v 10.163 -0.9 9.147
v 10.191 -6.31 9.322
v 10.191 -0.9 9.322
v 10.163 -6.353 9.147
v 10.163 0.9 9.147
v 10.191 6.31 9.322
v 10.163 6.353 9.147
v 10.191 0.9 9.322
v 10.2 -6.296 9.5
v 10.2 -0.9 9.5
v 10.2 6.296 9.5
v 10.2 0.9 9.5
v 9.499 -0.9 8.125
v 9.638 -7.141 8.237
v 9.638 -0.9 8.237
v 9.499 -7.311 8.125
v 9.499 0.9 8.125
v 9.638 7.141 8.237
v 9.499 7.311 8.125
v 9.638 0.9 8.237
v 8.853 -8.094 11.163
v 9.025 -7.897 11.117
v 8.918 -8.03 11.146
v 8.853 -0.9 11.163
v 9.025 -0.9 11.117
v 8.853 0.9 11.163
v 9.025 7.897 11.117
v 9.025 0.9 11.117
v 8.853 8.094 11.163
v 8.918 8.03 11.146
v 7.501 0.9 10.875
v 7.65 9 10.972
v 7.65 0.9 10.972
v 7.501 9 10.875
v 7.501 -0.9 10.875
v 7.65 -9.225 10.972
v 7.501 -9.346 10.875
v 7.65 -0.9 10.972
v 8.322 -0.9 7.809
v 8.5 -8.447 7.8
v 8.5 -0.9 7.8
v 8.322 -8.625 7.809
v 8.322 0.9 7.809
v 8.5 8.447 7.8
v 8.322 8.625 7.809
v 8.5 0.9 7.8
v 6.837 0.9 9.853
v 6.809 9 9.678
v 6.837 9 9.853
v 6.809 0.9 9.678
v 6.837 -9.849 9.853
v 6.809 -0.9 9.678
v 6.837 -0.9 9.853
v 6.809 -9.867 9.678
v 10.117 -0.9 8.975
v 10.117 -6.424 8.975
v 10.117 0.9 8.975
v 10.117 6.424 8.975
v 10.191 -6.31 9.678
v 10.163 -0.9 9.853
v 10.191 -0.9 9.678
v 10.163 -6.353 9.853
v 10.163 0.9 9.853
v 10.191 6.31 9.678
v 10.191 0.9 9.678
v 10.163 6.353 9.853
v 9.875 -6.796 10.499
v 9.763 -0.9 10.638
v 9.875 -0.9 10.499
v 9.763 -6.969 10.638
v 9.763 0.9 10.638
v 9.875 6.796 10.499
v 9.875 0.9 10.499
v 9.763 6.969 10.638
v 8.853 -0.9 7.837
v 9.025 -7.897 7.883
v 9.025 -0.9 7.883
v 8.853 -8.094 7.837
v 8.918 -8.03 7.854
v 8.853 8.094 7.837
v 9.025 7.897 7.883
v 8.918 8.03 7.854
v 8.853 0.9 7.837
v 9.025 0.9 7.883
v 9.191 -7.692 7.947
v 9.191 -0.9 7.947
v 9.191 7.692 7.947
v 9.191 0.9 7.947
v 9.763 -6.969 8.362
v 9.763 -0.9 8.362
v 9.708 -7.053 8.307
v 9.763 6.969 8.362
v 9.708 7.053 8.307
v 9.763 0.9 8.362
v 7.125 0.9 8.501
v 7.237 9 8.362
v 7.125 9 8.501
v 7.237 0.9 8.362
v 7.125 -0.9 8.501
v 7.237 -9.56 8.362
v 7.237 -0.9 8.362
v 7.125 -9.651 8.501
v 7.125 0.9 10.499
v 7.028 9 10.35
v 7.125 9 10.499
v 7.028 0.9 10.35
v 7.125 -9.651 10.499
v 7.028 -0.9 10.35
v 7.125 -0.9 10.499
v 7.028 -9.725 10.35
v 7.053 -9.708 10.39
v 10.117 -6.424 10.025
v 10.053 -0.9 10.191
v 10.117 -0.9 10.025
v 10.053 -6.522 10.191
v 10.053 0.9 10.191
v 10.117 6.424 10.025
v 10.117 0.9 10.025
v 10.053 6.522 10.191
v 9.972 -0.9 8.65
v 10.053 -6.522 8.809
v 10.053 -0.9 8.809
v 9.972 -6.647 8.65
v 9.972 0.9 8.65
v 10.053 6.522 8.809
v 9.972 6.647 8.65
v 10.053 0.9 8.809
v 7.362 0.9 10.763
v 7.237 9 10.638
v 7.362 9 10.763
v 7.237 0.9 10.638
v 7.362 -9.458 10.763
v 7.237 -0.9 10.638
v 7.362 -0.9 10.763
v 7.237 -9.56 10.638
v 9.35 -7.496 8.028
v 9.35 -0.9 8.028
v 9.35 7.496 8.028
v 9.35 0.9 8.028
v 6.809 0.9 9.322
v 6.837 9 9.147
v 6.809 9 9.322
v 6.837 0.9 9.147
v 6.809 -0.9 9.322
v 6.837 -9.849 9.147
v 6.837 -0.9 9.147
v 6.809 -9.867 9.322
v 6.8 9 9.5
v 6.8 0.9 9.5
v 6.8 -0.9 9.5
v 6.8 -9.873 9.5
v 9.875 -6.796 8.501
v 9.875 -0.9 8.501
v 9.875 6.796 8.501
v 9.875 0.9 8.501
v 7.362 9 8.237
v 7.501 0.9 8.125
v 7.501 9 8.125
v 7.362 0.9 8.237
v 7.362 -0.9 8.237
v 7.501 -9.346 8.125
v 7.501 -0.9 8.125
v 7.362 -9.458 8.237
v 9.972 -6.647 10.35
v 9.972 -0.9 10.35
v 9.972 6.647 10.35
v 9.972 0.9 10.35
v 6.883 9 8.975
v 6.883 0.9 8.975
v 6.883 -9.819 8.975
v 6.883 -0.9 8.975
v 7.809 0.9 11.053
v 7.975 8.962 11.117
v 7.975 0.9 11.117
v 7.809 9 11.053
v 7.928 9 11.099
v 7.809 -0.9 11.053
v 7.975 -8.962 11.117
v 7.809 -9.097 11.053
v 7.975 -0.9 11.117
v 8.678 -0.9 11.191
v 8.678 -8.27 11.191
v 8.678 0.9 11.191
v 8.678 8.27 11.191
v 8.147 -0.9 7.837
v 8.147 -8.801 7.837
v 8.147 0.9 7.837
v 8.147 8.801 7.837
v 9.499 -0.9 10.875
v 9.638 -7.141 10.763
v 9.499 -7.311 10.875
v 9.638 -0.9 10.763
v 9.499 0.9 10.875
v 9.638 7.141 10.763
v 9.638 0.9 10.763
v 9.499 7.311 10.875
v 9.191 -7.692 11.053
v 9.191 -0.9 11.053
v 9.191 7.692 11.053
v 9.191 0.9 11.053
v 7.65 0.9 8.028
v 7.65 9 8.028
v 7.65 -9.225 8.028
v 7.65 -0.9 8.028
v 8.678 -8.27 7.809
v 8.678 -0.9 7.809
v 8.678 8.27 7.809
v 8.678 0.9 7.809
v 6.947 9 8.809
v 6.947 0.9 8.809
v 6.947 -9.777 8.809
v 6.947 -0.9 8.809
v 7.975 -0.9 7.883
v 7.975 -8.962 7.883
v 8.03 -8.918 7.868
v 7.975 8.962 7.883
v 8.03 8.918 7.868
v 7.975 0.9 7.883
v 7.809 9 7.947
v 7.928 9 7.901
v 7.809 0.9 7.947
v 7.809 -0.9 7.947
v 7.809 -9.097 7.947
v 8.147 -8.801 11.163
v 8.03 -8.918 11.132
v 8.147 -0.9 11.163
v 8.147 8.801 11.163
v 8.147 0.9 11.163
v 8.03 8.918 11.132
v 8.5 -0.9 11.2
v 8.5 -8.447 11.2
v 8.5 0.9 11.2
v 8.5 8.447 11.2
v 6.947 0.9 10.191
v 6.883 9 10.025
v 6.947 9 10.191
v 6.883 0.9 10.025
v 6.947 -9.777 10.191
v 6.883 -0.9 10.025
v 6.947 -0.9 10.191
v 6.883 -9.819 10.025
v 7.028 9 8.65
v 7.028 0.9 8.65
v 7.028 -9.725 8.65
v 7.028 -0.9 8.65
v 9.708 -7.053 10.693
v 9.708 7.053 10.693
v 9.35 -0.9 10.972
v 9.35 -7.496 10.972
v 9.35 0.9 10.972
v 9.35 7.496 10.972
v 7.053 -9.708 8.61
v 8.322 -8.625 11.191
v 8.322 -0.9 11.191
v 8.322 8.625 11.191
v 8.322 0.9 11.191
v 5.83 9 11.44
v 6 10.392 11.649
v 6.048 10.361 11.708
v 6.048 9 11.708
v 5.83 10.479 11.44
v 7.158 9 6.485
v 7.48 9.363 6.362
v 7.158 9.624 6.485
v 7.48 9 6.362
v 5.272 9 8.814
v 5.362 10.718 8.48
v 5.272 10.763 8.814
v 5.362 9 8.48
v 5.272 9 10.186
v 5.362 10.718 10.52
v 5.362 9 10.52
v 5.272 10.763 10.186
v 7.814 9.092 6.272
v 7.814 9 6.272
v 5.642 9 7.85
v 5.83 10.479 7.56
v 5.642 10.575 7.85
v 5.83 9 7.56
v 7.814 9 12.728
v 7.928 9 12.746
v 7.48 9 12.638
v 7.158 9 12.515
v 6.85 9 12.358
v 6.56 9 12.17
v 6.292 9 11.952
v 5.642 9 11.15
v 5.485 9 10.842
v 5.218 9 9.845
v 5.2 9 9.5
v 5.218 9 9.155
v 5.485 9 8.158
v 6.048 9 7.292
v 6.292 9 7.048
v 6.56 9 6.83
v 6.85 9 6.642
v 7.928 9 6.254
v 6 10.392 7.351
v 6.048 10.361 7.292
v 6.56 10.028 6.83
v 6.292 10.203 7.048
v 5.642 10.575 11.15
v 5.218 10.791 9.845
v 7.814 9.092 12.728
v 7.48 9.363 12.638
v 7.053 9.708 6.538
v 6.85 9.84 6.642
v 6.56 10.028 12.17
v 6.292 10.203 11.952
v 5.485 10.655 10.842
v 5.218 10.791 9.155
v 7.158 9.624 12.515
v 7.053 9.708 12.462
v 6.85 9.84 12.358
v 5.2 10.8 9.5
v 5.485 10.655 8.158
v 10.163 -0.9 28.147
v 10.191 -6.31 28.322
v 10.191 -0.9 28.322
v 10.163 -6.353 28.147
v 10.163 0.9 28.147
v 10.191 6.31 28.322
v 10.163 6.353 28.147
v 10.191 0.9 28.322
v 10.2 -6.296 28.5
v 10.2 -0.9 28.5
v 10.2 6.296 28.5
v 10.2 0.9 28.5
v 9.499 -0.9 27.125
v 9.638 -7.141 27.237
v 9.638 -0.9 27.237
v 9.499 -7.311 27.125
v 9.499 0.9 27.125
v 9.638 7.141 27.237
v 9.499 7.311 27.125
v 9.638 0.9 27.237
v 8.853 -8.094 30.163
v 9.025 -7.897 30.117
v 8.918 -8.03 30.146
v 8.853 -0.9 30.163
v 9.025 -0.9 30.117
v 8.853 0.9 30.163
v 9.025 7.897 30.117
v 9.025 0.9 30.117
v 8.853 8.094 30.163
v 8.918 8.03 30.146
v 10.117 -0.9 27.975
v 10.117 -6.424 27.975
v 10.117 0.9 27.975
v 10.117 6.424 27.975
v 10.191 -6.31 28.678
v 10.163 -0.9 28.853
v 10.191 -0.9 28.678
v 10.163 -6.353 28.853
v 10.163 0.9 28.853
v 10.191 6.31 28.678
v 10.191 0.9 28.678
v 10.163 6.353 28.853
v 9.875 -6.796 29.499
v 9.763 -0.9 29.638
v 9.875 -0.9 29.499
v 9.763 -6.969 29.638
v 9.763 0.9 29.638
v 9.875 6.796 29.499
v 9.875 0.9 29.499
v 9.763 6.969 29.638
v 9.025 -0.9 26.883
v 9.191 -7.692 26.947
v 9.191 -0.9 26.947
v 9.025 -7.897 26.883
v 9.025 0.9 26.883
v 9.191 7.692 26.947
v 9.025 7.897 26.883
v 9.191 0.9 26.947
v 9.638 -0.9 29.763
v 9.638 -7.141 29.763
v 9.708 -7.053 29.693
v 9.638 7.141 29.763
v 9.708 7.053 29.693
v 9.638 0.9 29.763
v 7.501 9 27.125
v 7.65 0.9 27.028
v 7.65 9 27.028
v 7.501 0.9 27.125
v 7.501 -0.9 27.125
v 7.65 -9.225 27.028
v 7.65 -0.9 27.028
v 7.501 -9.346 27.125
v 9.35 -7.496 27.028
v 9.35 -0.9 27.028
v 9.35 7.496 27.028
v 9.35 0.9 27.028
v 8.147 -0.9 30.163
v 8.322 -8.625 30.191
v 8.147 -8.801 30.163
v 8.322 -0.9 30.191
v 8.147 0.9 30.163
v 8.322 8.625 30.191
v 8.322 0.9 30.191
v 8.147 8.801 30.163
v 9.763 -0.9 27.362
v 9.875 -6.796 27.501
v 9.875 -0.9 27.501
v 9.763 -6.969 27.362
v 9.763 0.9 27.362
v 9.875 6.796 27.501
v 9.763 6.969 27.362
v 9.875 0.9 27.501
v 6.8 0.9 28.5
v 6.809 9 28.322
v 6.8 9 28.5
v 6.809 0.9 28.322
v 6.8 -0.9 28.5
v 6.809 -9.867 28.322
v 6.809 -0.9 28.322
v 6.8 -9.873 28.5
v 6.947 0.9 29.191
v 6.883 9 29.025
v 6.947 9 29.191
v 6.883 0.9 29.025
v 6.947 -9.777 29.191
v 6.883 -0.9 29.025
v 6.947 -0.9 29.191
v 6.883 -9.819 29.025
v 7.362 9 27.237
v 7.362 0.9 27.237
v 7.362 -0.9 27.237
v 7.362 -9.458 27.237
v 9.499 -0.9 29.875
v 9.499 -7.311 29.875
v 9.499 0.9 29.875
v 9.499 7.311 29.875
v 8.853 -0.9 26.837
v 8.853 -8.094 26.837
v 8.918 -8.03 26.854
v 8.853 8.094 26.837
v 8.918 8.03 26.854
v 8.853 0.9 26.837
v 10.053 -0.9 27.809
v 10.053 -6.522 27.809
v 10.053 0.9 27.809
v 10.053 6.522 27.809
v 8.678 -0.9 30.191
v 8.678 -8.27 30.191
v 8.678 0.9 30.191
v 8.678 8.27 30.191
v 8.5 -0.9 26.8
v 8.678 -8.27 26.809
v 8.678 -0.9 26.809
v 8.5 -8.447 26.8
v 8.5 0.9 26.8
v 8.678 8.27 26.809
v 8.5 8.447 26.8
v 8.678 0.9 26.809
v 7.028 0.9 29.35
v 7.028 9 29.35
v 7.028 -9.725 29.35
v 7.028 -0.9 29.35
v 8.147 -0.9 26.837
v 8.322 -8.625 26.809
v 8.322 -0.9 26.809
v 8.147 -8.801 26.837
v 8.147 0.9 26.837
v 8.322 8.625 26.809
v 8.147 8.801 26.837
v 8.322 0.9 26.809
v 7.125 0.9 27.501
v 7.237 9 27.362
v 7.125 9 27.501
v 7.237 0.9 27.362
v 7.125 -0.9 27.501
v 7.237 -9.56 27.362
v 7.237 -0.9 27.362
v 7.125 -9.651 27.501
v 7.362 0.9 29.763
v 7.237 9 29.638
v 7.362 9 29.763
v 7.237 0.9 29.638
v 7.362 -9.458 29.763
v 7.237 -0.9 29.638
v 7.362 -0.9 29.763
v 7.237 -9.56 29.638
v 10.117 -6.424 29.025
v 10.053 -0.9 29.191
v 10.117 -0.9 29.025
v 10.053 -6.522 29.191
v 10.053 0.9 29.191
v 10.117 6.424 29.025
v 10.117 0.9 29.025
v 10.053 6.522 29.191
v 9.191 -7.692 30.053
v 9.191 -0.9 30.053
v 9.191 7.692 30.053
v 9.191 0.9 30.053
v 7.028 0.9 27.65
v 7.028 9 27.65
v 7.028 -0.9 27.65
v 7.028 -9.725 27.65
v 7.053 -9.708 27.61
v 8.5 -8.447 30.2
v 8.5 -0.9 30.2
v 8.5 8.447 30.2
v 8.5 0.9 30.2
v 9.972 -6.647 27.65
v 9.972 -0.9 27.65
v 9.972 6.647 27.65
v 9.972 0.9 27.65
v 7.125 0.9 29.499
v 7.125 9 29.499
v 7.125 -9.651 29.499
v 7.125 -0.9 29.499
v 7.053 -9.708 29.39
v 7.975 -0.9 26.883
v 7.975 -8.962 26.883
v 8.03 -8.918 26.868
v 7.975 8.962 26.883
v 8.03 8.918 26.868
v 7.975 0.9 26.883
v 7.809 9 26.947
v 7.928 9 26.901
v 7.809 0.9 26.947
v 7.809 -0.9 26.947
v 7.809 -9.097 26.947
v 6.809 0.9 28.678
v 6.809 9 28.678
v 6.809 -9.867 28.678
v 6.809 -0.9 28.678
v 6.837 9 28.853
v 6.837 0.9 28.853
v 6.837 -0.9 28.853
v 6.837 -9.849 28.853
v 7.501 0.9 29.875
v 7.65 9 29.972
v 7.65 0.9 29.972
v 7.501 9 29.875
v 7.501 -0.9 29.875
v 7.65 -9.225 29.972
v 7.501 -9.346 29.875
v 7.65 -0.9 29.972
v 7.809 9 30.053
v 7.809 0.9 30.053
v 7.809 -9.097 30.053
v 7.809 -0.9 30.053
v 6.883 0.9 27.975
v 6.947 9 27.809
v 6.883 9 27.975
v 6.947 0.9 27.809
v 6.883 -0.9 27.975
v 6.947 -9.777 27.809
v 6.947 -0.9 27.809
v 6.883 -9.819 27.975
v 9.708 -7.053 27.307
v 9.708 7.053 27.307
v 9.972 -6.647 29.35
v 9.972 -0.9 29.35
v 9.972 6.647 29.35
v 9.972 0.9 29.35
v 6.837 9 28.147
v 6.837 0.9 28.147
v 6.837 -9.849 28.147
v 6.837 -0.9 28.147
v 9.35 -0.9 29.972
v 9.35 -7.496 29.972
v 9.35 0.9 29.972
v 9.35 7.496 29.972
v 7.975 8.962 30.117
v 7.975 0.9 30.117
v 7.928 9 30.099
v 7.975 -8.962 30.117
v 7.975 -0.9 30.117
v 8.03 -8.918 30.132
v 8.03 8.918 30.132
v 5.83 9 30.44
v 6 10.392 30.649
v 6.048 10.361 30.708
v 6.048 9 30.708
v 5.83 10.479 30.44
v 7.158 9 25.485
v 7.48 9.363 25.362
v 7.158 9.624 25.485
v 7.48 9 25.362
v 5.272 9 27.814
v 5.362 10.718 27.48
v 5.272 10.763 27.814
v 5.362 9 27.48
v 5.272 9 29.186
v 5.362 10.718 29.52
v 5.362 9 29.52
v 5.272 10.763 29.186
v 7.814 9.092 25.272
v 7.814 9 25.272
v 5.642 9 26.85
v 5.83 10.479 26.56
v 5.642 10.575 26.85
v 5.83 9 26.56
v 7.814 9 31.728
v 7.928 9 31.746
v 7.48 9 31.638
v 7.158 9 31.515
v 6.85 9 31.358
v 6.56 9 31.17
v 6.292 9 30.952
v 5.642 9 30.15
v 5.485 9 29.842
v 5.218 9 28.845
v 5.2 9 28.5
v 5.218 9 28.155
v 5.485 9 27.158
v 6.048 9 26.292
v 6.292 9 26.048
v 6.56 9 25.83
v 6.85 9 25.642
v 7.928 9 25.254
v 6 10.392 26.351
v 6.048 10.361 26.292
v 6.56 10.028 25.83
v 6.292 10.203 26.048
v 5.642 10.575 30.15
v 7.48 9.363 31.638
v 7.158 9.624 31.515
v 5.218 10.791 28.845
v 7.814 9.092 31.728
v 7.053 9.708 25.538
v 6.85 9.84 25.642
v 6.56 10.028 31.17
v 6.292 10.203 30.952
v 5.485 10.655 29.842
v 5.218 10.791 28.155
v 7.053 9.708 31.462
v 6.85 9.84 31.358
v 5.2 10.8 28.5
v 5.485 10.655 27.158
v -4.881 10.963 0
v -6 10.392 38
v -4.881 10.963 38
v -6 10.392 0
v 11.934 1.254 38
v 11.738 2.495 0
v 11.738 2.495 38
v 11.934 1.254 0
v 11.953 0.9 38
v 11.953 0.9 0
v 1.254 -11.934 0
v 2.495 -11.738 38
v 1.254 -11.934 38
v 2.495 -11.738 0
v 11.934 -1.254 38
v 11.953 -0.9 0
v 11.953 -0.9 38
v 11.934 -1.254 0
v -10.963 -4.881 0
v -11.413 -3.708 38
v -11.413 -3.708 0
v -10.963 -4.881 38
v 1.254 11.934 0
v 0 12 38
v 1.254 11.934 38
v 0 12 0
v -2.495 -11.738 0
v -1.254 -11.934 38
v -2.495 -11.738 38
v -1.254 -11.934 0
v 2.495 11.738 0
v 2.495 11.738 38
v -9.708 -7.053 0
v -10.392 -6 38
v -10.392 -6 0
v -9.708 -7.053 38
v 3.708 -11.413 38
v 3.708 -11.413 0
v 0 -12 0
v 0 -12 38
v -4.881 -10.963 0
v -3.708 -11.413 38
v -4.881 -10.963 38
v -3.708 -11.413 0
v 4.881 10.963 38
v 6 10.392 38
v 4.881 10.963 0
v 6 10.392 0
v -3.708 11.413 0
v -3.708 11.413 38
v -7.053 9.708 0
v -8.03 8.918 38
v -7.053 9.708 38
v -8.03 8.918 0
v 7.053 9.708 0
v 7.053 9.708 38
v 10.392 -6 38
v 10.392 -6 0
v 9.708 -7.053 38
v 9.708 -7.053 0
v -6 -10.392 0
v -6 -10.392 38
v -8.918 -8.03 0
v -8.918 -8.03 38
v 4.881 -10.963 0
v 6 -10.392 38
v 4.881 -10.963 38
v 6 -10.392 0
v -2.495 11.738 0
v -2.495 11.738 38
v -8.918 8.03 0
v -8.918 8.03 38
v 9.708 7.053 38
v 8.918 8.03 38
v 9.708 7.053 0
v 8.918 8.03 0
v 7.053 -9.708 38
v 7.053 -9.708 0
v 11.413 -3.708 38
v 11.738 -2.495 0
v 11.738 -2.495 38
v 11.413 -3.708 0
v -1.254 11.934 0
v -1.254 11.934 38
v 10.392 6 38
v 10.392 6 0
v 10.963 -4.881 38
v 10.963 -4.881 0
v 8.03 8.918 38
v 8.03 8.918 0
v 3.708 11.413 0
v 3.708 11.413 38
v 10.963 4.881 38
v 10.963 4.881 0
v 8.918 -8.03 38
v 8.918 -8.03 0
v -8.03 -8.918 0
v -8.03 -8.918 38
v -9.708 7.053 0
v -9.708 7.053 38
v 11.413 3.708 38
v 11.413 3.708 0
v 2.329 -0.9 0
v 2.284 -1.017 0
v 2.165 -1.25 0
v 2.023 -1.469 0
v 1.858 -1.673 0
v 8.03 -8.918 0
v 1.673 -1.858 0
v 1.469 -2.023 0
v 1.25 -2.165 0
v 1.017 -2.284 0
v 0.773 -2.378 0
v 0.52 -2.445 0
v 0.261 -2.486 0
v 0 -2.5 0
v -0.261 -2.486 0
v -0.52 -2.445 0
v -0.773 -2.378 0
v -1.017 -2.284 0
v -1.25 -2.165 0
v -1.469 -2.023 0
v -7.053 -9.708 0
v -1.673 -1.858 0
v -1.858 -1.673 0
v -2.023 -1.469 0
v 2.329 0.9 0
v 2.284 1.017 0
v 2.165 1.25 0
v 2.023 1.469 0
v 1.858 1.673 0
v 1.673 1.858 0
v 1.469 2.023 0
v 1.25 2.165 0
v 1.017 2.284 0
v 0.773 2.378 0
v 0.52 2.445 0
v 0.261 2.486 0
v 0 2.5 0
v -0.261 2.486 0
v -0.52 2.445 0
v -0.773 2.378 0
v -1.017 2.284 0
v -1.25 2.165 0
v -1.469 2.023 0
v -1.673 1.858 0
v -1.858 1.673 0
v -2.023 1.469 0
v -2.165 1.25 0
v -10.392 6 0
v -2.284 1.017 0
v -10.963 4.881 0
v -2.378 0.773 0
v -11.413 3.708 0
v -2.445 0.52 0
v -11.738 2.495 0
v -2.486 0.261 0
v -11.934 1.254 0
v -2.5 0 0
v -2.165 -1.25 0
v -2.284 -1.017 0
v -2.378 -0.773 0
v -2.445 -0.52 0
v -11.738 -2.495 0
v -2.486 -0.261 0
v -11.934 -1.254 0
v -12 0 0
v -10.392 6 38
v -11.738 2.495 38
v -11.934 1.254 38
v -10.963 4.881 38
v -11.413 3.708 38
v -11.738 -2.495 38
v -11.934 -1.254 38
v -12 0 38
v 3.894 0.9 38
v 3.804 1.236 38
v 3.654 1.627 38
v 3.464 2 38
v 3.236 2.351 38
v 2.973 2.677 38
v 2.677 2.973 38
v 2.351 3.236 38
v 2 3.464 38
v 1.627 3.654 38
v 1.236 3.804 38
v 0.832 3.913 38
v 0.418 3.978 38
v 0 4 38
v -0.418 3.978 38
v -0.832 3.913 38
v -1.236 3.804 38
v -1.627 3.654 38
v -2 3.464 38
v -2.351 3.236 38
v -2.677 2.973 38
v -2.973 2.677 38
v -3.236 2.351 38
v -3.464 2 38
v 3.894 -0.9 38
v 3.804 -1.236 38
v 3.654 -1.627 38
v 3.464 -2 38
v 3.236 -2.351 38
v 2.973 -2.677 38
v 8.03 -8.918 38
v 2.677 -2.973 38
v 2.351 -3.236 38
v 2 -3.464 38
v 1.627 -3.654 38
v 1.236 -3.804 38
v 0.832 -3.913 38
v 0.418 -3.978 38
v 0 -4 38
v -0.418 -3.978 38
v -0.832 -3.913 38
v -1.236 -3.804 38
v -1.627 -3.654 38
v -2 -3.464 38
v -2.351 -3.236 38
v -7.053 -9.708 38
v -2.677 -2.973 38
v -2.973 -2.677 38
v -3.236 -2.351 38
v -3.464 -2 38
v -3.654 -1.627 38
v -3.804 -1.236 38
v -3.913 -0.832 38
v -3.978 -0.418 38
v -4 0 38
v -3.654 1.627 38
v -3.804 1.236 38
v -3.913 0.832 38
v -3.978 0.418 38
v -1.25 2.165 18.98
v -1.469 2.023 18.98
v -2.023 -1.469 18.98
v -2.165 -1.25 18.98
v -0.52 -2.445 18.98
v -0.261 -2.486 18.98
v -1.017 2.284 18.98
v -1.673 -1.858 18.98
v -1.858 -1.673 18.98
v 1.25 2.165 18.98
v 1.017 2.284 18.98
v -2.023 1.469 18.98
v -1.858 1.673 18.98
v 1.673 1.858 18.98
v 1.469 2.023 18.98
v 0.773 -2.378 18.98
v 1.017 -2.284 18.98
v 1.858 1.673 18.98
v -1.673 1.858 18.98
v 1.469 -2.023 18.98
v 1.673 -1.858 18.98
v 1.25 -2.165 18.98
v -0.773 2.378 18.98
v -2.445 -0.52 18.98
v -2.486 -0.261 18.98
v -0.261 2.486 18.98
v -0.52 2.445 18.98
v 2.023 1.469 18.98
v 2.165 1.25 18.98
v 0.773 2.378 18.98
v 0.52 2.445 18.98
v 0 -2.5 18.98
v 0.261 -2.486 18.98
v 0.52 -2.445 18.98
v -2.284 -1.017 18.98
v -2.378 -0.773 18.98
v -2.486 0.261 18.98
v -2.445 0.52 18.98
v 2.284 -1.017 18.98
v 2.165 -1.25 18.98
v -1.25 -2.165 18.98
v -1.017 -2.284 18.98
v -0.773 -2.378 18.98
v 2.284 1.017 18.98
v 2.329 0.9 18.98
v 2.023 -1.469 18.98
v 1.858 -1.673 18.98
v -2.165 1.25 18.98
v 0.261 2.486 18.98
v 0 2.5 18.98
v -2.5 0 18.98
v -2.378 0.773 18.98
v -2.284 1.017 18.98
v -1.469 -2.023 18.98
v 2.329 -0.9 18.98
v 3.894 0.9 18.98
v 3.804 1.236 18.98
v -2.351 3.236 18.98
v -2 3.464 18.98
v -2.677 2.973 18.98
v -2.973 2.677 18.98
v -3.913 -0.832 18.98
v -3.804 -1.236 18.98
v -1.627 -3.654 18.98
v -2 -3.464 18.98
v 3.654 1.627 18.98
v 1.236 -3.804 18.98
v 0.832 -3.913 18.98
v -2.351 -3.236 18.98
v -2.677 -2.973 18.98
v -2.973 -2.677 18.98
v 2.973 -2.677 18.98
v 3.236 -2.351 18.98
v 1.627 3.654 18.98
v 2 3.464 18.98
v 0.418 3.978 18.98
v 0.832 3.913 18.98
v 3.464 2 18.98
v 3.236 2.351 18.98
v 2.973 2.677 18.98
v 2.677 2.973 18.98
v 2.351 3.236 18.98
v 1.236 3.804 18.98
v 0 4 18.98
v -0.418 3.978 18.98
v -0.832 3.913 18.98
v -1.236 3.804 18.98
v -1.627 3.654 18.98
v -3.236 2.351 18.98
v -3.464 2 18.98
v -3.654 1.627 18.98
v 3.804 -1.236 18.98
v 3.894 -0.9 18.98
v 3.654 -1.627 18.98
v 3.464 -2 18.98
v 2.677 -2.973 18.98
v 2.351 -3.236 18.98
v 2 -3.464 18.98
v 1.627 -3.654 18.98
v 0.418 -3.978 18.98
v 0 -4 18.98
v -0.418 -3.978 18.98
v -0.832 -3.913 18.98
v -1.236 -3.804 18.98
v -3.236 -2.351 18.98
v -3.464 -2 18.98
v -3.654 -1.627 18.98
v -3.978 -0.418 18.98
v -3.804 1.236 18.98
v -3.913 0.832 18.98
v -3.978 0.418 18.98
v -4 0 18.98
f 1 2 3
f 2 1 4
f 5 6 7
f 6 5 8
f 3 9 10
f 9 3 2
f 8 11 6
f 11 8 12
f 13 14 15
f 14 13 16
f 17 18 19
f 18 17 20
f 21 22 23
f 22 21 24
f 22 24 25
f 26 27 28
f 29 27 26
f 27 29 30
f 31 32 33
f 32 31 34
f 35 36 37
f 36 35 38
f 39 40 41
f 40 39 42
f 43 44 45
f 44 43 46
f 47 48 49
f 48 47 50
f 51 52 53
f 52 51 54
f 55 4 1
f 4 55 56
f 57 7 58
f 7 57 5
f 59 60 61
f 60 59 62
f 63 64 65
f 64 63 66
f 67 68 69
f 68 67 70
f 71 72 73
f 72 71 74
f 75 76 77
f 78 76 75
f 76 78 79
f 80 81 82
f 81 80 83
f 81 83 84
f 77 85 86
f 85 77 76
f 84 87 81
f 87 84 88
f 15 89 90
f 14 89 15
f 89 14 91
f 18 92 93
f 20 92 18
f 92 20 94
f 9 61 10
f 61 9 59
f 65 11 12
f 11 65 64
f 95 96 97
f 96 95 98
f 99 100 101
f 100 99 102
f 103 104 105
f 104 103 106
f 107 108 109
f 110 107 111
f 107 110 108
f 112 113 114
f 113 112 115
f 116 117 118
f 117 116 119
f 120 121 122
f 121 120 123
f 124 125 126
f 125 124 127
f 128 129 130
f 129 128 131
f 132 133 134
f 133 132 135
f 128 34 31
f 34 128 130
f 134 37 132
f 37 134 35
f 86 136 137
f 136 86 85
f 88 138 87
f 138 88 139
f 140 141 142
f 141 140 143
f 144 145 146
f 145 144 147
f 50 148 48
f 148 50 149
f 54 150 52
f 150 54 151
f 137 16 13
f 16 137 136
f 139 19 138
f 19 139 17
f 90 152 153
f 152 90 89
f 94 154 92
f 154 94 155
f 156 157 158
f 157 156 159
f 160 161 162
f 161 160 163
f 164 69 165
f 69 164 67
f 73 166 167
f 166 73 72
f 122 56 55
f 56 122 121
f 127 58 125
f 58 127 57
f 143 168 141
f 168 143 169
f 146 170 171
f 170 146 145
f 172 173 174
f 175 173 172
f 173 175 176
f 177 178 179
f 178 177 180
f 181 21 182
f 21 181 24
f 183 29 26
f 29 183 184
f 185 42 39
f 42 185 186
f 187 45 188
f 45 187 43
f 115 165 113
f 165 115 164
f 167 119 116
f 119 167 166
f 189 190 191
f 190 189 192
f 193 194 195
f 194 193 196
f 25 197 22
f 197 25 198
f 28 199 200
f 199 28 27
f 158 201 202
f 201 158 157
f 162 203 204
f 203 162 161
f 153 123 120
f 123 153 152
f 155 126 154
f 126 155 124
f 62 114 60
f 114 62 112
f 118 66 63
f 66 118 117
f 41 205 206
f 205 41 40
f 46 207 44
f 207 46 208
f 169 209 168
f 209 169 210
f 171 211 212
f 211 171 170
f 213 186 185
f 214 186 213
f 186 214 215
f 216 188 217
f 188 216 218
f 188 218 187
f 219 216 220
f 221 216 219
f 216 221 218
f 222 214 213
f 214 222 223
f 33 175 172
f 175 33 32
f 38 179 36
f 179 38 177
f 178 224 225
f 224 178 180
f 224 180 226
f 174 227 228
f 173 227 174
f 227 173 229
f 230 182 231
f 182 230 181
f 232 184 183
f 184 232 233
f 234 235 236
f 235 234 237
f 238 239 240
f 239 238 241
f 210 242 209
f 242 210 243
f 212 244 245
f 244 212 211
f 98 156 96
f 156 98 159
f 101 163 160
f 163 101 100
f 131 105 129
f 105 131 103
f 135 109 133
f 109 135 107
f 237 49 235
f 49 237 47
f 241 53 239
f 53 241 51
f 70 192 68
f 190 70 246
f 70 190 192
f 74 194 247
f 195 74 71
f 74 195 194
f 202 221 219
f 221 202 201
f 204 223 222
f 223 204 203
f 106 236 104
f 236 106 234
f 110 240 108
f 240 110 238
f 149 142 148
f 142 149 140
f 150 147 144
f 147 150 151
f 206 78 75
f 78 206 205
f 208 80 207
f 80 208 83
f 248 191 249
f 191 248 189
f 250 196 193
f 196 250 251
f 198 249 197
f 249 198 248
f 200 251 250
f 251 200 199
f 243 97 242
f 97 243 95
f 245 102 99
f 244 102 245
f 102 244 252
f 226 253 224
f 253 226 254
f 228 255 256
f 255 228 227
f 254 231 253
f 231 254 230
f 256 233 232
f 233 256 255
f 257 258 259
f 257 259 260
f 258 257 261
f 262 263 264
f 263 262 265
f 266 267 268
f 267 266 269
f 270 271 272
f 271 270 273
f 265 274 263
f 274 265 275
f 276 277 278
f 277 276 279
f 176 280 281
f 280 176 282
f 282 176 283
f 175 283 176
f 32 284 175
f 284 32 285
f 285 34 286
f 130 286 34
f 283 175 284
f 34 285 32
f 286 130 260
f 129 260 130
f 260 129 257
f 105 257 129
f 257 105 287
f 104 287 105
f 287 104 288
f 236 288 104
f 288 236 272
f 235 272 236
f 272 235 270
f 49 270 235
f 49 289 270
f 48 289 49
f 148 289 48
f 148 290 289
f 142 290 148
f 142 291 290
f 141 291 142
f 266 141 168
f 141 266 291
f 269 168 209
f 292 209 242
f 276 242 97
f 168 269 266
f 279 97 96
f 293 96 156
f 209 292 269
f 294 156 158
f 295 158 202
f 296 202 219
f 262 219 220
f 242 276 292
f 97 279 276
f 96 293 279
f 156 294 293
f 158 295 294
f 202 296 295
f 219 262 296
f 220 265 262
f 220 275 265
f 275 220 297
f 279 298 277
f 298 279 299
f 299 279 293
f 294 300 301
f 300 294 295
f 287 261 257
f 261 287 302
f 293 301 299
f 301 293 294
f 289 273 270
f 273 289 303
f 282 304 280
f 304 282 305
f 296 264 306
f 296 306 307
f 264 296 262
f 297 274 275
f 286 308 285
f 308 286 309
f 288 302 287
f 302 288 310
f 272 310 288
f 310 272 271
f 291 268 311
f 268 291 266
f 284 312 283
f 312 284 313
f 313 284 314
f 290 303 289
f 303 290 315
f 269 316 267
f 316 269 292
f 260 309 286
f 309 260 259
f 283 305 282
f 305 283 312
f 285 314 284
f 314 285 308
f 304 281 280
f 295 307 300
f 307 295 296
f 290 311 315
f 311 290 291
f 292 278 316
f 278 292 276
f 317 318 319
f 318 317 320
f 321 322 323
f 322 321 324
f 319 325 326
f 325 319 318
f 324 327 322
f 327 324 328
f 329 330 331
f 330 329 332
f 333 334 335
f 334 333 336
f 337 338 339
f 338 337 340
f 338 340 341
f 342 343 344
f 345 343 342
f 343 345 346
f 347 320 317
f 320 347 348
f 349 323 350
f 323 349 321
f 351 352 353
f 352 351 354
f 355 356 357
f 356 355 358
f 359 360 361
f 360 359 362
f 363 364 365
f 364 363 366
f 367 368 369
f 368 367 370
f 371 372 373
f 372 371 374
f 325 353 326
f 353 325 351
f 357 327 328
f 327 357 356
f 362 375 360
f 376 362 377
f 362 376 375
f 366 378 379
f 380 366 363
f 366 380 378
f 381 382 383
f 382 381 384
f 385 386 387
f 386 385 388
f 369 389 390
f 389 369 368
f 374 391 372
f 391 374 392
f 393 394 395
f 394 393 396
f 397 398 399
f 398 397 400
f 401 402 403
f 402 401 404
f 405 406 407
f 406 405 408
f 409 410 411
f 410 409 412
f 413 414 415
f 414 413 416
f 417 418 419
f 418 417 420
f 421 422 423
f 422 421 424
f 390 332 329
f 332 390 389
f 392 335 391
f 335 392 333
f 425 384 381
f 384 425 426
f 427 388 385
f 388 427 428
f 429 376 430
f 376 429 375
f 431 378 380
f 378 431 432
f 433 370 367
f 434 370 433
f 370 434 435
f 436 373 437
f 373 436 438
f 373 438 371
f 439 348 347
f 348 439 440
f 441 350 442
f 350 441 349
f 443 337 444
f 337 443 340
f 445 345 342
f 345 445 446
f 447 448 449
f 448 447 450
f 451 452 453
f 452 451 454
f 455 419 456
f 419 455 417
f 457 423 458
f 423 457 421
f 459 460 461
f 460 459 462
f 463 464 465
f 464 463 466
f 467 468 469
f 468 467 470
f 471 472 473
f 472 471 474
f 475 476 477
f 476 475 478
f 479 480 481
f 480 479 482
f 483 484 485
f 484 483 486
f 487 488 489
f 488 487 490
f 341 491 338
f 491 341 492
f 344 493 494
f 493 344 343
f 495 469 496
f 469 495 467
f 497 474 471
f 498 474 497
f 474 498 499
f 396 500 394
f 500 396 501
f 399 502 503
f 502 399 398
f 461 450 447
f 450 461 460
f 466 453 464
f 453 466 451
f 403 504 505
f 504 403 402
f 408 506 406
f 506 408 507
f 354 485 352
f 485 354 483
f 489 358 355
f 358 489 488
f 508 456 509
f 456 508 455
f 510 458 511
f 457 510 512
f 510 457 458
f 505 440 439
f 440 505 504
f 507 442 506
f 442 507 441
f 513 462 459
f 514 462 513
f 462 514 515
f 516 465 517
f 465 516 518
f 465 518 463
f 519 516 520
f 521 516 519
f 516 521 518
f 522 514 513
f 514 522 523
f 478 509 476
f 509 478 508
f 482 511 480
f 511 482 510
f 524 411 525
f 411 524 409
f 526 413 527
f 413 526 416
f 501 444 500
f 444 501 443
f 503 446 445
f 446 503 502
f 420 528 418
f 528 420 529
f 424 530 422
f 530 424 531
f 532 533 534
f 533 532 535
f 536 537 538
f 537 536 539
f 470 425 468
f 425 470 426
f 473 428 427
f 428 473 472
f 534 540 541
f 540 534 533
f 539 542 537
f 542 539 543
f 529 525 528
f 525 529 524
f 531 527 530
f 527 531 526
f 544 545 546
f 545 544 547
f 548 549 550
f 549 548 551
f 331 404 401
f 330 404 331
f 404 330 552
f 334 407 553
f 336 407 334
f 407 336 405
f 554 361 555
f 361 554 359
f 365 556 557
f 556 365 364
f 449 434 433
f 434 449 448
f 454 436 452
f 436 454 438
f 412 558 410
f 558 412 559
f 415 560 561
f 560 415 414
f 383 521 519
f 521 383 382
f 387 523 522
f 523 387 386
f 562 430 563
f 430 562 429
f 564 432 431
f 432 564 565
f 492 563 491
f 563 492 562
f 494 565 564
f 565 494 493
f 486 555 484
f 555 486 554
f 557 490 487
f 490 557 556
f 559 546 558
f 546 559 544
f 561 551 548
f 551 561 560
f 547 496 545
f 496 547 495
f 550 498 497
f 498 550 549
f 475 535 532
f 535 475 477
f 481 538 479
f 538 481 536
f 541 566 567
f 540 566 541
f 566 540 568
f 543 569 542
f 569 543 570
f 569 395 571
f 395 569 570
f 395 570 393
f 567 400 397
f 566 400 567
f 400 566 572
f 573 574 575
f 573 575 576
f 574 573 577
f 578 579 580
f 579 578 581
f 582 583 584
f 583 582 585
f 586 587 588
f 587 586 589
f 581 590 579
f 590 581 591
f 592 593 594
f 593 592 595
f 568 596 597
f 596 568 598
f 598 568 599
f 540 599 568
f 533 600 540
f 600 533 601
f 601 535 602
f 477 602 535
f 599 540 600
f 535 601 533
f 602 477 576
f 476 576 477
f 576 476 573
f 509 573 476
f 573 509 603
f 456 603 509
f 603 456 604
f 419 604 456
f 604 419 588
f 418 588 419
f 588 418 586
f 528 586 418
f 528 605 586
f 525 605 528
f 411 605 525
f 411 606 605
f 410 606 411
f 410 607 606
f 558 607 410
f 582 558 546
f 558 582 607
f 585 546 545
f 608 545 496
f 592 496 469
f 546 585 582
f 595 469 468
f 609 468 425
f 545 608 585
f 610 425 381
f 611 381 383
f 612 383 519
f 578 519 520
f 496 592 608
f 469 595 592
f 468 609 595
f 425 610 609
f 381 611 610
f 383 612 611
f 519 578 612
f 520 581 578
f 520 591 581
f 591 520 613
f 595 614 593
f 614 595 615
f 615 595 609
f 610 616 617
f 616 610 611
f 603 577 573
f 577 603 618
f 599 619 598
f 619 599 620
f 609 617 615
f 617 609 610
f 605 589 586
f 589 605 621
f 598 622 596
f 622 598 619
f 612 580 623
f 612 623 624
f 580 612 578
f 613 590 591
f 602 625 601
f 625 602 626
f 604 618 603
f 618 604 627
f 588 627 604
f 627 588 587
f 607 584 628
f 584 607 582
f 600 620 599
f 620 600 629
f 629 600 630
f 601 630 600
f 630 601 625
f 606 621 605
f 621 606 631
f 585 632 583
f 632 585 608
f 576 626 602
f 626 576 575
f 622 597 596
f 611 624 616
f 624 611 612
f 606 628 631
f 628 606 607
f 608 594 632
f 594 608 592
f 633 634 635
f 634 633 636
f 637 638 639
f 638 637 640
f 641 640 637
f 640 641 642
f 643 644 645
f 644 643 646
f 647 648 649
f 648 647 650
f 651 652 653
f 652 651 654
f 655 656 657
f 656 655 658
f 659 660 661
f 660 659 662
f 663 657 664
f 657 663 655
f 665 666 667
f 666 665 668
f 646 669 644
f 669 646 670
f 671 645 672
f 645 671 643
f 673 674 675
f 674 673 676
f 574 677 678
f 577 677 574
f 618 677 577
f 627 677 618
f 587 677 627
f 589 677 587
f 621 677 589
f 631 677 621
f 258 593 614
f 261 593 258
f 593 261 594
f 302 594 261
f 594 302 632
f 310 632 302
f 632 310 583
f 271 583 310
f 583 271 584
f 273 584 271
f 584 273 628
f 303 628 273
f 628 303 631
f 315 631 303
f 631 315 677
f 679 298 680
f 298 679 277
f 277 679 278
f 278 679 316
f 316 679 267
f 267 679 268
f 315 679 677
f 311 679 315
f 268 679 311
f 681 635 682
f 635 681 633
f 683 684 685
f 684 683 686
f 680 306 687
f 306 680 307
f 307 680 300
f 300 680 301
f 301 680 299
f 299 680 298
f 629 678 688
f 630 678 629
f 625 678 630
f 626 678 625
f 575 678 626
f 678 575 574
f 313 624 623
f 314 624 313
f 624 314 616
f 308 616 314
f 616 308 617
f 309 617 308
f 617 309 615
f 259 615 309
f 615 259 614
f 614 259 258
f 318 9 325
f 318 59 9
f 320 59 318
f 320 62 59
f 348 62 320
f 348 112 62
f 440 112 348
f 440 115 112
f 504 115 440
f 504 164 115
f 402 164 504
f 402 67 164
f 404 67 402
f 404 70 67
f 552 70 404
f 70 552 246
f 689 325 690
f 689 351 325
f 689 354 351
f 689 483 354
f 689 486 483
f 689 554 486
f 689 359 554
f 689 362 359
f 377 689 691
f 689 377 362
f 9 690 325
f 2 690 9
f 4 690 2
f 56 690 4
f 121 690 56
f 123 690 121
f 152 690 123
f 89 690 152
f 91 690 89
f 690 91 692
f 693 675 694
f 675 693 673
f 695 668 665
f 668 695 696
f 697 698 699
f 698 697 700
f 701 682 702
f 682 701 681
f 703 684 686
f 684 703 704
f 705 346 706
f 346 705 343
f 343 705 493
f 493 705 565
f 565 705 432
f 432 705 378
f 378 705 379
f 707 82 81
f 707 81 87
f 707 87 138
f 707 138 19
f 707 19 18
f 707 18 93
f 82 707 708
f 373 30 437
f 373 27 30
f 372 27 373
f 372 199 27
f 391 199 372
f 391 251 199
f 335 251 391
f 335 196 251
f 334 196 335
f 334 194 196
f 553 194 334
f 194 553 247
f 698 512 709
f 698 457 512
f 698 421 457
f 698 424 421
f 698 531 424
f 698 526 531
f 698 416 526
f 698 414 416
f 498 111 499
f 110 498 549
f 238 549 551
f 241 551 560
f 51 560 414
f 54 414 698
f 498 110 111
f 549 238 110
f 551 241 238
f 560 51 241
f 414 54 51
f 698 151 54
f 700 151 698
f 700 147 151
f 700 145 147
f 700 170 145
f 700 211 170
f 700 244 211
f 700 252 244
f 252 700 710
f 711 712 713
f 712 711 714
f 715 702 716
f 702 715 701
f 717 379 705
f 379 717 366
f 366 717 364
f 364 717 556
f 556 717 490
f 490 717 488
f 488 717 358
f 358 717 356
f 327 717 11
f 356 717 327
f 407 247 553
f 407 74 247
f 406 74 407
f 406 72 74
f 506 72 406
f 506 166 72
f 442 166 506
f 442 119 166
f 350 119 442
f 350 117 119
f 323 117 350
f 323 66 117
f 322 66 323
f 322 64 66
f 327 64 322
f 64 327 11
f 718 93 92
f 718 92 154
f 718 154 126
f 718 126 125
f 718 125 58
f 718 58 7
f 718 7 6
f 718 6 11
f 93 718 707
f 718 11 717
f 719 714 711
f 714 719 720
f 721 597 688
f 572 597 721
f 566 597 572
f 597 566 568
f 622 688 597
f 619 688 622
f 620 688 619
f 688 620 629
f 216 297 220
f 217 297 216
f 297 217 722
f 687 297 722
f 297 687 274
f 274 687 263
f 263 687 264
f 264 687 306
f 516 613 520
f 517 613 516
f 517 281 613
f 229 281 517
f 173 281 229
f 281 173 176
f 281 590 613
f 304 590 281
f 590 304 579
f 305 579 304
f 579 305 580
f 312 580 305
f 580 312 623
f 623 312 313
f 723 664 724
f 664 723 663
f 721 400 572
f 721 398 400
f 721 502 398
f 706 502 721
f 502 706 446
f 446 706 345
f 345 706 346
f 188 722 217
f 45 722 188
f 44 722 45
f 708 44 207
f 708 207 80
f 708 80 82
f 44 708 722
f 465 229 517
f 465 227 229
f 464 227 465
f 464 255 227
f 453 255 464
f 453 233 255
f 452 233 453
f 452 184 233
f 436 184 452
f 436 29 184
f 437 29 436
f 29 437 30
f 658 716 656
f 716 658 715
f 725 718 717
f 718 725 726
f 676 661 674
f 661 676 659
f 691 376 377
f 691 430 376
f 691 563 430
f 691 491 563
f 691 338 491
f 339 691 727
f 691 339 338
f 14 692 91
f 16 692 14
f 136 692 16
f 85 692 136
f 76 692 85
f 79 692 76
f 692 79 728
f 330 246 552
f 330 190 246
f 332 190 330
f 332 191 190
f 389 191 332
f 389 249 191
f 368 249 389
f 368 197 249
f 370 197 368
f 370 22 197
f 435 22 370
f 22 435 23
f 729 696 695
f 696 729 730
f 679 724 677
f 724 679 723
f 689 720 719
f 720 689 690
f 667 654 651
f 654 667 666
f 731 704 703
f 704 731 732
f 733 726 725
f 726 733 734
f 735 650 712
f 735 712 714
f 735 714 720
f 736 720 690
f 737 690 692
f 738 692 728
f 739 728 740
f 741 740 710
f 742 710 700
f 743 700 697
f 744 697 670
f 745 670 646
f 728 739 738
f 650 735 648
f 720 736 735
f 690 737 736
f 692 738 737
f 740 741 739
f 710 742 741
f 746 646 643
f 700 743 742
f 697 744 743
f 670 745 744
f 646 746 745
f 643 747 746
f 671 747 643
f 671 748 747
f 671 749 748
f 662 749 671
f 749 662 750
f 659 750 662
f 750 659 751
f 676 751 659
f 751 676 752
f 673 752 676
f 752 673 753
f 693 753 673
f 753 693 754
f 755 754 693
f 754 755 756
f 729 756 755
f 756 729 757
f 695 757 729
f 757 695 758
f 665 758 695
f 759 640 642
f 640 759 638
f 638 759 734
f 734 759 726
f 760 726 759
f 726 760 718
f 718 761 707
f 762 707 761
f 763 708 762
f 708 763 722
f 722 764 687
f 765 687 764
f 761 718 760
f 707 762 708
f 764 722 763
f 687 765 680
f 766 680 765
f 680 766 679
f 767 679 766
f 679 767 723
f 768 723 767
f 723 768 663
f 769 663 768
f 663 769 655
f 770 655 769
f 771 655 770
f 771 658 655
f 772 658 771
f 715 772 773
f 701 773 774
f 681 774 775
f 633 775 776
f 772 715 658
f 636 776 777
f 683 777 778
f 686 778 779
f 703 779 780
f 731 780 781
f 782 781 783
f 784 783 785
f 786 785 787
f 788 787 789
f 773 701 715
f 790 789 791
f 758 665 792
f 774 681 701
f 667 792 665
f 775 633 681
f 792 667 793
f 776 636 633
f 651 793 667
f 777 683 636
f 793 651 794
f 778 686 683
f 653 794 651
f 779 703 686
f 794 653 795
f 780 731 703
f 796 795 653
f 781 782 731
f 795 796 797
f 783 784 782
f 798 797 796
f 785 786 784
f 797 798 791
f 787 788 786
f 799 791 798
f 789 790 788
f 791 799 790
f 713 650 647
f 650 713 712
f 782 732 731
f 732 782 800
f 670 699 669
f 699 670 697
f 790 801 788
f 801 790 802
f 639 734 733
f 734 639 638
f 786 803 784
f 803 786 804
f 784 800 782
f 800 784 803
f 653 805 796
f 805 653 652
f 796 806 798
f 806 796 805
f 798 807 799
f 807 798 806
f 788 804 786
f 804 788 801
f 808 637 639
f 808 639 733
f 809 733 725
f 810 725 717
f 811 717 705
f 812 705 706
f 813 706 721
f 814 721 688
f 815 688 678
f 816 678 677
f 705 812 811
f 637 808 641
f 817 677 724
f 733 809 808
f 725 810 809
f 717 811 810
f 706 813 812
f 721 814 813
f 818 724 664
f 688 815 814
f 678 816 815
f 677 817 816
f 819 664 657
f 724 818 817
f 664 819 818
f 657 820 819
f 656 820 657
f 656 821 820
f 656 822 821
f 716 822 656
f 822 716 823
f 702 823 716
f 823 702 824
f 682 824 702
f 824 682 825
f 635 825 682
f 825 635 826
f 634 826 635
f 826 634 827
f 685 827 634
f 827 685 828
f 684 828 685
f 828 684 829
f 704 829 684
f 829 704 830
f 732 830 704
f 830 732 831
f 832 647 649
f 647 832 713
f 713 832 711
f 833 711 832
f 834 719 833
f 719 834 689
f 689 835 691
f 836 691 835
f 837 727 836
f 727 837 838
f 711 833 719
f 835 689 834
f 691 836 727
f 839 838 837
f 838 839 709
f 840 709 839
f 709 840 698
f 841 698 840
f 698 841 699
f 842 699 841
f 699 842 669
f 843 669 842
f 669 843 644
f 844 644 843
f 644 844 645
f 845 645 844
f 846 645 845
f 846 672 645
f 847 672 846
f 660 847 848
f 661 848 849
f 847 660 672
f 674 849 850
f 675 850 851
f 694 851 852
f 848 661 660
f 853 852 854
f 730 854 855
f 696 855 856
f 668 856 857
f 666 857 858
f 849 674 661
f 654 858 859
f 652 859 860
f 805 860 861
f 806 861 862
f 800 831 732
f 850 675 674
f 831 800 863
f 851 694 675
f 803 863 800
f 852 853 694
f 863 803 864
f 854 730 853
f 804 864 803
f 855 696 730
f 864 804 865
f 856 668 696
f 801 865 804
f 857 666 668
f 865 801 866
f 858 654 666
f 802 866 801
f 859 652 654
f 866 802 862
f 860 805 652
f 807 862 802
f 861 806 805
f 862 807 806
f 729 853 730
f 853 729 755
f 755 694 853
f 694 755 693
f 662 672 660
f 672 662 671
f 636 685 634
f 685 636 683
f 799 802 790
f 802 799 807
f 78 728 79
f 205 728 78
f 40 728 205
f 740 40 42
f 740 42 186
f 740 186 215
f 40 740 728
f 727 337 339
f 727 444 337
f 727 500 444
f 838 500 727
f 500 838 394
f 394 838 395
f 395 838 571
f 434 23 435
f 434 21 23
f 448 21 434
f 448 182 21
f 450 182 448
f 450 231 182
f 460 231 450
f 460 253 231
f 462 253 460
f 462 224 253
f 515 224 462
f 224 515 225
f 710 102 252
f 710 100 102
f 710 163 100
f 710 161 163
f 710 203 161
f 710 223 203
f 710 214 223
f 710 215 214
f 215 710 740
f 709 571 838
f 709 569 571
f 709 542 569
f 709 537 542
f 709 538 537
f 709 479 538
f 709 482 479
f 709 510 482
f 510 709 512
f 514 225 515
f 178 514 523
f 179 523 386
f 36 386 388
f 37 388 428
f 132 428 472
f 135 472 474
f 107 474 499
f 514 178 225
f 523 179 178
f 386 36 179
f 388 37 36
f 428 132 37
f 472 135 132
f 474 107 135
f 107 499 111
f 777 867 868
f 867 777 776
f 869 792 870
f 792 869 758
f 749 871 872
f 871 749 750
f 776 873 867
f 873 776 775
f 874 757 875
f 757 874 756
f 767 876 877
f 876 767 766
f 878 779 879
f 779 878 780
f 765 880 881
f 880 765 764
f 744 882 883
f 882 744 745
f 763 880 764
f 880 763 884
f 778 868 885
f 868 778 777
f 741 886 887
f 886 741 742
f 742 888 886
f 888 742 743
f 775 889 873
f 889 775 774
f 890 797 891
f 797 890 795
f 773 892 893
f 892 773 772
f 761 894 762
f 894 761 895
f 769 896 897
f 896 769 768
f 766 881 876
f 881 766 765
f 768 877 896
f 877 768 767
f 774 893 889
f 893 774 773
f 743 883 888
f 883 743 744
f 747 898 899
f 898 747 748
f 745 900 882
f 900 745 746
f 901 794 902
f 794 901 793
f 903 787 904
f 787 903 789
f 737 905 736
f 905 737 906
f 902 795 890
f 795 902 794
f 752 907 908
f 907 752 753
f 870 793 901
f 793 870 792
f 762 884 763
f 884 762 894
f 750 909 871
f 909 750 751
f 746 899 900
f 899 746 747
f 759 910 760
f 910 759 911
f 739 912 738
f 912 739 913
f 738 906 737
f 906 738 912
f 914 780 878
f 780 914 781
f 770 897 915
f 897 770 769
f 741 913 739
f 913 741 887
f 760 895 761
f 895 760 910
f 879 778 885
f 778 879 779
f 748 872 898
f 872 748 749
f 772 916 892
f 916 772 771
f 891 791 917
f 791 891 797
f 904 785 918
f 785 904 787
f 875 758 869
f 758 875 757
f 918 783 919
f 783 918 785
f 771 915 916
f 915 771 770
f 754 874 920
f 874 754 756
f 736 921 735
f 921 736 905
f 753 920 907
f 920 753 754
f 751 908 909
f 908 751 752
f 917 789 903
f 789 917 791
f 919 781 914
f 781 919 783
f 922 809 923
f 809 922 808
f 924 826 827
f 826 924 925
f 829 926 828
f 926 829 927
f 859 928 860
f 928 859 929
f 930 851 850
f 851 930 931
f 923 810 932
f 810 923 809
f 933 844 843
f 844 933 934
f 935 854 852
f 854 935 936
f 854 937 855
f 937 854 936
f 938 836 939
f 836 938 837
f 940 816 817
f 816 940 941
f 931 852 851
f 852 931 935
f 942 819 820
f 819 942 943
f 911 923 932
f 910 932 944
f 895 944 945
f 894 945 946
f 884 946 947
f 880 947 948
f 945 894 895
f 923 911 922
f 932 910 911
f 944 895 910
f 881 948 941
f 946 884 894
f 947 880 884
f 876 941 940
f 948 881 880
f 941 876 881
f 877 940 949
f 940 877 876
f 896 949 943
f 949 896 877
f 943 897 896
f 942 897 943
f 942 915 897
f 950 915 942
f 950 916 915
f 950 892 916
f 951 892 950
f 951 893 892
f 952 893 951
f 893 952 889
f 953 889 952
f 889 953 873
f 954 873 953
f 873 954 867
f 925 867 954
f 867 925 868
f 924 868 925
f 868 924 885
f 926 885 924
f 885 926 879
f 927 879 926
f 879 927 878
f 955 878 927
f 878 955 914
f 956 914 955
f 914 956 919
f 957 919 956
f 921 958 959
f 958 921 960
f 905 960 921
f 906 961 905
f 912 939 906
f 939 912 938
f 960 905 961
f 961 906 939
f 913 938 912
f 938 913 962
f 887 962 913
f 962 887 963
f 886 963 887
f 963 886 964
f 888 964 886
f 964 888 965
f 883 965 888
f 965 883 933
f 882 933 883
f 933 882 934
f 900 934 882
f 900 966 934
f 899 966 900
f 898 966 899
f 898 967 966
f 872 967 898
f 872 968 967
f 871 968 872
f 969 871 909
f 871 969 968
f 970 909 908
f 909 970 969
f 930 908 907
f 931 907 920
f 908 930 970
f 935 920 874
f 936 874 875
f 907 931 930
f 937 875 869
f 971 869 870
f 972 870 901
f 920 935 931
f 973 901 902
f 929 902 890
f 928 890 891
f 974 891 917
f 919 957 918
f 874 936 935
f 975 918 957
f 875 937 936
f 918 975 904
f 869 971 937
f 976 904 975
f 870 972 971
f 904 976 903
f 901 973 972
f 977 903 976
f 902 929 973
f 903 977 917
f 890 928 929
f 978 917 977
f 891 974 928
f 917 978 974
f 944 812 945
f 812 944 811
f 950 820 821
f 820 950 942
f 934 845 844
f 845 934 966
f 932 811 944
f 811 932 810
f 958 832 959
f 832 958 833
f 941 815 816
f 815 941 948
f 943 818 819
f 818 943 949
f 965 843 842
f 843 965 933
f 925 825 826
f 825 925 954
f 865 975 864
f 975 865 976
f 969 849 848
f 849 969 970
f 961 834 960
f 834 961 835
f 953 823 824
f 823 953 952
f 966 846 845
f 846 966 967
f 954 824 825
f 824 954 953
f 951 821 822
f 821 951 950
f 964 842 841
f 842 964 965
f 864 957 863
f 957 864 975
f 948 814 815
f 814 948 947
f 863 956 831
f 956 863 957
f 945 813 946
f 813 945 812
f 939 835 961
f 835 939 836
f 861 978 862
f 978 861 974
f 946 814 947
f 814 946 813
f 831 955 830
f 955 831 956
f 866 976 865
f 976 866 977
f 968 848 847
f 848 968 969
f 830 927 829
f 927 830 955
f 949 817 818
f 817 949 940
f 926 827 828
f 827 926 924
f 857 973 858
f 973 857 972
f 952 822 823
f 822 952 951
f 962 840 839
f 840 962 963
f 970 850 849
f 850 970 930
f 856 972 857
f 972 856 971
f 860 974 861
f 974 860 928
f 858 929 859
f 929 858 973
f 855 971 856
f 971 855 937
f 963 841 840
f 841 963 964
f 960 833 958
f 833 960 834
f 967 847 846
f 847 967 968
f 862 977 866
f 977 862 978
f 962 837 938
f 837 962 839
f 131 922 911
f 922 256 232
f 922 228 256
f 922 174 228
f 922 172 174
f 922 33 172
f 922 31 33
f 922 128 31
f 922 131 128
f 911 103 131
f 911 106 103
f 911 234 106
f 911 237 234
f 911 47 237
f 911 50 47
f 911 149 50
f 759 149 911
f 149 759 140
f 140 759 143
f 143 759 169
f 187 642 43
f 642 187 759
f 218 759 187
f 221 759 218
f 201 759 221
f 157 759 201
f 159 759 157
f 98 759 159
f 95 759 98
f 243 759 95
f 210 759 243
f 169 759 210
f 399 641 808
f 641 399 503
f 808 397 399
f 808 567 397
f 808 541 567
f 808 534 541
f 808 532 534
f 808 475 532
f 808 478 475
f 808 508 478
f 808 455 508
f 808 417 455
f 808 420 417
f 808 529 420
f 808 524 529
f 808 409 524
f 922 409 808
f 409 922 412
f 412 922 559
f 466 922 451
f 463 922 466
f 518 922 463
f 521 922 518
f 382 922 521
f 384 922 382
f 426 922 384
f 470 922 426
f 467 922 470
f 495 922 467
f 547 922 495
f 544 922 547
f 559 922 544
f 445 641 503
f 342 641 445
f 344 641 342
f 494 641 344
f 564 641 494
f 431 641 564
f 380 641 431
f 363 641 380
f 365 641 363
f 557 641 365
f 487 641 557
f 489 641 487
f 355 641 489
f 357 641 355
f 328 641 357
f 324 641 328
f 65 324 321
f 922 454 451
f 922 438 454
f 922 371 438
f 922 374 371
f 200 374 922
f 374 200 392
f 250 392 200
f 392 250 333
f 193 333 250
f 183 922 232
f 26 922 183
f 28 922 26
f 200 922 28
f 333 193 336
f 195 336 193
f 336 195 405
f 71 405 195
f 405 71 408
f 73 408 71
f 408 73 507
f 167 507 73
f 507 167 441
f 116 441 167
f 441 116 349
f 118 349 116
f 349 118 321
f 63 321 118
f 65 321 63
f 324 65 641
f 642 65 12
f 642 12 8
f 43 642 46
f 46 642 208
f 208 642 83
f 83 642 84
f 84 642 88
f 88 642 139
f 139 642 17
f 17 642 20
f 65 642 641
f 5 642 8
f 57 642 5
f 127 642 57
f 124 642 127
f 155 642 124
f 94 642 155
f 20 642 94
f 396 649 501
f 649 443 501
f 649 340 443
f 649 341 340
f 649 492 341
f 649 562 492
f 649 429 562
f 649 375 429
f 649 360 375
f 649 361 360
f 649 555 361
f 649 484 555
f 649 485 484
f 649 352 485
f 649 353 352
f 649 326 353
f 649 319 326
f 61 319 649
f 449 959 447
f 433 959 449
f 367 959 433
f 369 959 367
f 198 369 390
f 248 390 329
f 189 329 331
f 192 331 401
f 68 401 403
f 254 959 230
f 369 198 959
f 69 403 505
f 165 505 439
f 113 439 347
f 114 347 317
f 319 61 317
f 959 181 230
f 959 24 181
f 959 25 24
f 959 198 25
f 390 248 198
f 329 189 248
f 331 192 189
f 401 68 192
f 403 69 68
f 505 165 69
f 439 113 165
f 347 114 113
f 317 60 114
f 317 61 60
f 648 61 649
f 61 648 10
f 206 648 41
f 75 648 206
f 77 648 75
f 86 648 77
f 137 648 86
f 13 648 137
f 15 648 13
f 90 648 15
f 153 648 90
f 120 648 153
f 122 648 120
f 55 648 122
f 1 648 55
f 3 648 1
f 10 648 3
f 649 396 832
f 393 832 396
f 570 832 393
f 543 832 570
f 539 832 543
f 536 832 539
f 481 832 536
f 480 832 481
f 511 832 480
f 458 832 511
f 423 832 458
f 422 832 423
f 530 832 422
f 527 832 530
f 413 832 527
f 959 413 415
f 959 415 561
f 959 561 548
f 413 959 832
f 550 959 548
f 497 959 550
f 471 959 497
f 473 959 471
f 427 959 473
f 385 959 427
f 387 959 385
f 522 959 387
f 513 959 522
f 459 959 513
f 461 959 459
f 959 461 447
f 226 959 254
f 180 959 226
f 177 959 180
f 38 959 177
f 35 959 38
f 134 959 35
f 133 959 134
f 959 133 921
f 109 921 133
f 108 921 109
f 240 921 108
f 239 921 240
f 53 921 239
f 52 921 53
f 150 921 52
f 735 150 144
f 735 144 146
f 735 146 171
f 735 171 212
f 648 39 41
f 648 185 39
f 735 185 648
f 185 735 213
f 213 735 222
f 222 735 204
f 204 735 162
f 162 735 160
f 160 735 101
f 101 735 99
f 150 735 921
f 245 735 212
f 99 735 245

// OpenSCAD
// Split coupling 5x8 heavy-duty
// One-piece split coupling for 5 mm and 8 mm shafts; clamp slots are fully through-cut.
$fn = 60;
eps = 0.02;
shaft_a_d = 5;
shaft_b_d = 8;
outer_d = 24;
length = 38;
slot_w = 1.8;
clamp_screw_d = 3.4;
head_recess_d = 6.6;
head_recess_depth = 3;

module clamp_screw(z_pos) {
    translate([outer_d / 2 - 3.5, -outer_d / 2 - eps, z_pos])
        rotate([-90, 0, 0]) cylinder(d = clamp_screw_d, h = outer_d + 2 * eps);
    translate([outer_d / 2 - 3.5, outer_d / 2 - head_recess_depth, z_pos])
        rotate([-90, 0, 0]) cylinder(d = head_recess_d, h = head_recess_depth + eps);
}

difference() {
    cylinder(d = outer_d, h = length);
    translate([0, 0, -eps]) cylinder(d = shaft_a_d, h = length / 2 + eps);
    translate([0, 0, length / 2 - eps]) cylinder(d = shaft_b_d, h = length / 2 + eps);
    translate([0, -slot_w / 2, -eps]) cube([outer_d / 2 + eps, slot_w, length + 2 * eps]);
    clamp_screw(length / 4);
    clamp_screw(3 * length / 4);
}
